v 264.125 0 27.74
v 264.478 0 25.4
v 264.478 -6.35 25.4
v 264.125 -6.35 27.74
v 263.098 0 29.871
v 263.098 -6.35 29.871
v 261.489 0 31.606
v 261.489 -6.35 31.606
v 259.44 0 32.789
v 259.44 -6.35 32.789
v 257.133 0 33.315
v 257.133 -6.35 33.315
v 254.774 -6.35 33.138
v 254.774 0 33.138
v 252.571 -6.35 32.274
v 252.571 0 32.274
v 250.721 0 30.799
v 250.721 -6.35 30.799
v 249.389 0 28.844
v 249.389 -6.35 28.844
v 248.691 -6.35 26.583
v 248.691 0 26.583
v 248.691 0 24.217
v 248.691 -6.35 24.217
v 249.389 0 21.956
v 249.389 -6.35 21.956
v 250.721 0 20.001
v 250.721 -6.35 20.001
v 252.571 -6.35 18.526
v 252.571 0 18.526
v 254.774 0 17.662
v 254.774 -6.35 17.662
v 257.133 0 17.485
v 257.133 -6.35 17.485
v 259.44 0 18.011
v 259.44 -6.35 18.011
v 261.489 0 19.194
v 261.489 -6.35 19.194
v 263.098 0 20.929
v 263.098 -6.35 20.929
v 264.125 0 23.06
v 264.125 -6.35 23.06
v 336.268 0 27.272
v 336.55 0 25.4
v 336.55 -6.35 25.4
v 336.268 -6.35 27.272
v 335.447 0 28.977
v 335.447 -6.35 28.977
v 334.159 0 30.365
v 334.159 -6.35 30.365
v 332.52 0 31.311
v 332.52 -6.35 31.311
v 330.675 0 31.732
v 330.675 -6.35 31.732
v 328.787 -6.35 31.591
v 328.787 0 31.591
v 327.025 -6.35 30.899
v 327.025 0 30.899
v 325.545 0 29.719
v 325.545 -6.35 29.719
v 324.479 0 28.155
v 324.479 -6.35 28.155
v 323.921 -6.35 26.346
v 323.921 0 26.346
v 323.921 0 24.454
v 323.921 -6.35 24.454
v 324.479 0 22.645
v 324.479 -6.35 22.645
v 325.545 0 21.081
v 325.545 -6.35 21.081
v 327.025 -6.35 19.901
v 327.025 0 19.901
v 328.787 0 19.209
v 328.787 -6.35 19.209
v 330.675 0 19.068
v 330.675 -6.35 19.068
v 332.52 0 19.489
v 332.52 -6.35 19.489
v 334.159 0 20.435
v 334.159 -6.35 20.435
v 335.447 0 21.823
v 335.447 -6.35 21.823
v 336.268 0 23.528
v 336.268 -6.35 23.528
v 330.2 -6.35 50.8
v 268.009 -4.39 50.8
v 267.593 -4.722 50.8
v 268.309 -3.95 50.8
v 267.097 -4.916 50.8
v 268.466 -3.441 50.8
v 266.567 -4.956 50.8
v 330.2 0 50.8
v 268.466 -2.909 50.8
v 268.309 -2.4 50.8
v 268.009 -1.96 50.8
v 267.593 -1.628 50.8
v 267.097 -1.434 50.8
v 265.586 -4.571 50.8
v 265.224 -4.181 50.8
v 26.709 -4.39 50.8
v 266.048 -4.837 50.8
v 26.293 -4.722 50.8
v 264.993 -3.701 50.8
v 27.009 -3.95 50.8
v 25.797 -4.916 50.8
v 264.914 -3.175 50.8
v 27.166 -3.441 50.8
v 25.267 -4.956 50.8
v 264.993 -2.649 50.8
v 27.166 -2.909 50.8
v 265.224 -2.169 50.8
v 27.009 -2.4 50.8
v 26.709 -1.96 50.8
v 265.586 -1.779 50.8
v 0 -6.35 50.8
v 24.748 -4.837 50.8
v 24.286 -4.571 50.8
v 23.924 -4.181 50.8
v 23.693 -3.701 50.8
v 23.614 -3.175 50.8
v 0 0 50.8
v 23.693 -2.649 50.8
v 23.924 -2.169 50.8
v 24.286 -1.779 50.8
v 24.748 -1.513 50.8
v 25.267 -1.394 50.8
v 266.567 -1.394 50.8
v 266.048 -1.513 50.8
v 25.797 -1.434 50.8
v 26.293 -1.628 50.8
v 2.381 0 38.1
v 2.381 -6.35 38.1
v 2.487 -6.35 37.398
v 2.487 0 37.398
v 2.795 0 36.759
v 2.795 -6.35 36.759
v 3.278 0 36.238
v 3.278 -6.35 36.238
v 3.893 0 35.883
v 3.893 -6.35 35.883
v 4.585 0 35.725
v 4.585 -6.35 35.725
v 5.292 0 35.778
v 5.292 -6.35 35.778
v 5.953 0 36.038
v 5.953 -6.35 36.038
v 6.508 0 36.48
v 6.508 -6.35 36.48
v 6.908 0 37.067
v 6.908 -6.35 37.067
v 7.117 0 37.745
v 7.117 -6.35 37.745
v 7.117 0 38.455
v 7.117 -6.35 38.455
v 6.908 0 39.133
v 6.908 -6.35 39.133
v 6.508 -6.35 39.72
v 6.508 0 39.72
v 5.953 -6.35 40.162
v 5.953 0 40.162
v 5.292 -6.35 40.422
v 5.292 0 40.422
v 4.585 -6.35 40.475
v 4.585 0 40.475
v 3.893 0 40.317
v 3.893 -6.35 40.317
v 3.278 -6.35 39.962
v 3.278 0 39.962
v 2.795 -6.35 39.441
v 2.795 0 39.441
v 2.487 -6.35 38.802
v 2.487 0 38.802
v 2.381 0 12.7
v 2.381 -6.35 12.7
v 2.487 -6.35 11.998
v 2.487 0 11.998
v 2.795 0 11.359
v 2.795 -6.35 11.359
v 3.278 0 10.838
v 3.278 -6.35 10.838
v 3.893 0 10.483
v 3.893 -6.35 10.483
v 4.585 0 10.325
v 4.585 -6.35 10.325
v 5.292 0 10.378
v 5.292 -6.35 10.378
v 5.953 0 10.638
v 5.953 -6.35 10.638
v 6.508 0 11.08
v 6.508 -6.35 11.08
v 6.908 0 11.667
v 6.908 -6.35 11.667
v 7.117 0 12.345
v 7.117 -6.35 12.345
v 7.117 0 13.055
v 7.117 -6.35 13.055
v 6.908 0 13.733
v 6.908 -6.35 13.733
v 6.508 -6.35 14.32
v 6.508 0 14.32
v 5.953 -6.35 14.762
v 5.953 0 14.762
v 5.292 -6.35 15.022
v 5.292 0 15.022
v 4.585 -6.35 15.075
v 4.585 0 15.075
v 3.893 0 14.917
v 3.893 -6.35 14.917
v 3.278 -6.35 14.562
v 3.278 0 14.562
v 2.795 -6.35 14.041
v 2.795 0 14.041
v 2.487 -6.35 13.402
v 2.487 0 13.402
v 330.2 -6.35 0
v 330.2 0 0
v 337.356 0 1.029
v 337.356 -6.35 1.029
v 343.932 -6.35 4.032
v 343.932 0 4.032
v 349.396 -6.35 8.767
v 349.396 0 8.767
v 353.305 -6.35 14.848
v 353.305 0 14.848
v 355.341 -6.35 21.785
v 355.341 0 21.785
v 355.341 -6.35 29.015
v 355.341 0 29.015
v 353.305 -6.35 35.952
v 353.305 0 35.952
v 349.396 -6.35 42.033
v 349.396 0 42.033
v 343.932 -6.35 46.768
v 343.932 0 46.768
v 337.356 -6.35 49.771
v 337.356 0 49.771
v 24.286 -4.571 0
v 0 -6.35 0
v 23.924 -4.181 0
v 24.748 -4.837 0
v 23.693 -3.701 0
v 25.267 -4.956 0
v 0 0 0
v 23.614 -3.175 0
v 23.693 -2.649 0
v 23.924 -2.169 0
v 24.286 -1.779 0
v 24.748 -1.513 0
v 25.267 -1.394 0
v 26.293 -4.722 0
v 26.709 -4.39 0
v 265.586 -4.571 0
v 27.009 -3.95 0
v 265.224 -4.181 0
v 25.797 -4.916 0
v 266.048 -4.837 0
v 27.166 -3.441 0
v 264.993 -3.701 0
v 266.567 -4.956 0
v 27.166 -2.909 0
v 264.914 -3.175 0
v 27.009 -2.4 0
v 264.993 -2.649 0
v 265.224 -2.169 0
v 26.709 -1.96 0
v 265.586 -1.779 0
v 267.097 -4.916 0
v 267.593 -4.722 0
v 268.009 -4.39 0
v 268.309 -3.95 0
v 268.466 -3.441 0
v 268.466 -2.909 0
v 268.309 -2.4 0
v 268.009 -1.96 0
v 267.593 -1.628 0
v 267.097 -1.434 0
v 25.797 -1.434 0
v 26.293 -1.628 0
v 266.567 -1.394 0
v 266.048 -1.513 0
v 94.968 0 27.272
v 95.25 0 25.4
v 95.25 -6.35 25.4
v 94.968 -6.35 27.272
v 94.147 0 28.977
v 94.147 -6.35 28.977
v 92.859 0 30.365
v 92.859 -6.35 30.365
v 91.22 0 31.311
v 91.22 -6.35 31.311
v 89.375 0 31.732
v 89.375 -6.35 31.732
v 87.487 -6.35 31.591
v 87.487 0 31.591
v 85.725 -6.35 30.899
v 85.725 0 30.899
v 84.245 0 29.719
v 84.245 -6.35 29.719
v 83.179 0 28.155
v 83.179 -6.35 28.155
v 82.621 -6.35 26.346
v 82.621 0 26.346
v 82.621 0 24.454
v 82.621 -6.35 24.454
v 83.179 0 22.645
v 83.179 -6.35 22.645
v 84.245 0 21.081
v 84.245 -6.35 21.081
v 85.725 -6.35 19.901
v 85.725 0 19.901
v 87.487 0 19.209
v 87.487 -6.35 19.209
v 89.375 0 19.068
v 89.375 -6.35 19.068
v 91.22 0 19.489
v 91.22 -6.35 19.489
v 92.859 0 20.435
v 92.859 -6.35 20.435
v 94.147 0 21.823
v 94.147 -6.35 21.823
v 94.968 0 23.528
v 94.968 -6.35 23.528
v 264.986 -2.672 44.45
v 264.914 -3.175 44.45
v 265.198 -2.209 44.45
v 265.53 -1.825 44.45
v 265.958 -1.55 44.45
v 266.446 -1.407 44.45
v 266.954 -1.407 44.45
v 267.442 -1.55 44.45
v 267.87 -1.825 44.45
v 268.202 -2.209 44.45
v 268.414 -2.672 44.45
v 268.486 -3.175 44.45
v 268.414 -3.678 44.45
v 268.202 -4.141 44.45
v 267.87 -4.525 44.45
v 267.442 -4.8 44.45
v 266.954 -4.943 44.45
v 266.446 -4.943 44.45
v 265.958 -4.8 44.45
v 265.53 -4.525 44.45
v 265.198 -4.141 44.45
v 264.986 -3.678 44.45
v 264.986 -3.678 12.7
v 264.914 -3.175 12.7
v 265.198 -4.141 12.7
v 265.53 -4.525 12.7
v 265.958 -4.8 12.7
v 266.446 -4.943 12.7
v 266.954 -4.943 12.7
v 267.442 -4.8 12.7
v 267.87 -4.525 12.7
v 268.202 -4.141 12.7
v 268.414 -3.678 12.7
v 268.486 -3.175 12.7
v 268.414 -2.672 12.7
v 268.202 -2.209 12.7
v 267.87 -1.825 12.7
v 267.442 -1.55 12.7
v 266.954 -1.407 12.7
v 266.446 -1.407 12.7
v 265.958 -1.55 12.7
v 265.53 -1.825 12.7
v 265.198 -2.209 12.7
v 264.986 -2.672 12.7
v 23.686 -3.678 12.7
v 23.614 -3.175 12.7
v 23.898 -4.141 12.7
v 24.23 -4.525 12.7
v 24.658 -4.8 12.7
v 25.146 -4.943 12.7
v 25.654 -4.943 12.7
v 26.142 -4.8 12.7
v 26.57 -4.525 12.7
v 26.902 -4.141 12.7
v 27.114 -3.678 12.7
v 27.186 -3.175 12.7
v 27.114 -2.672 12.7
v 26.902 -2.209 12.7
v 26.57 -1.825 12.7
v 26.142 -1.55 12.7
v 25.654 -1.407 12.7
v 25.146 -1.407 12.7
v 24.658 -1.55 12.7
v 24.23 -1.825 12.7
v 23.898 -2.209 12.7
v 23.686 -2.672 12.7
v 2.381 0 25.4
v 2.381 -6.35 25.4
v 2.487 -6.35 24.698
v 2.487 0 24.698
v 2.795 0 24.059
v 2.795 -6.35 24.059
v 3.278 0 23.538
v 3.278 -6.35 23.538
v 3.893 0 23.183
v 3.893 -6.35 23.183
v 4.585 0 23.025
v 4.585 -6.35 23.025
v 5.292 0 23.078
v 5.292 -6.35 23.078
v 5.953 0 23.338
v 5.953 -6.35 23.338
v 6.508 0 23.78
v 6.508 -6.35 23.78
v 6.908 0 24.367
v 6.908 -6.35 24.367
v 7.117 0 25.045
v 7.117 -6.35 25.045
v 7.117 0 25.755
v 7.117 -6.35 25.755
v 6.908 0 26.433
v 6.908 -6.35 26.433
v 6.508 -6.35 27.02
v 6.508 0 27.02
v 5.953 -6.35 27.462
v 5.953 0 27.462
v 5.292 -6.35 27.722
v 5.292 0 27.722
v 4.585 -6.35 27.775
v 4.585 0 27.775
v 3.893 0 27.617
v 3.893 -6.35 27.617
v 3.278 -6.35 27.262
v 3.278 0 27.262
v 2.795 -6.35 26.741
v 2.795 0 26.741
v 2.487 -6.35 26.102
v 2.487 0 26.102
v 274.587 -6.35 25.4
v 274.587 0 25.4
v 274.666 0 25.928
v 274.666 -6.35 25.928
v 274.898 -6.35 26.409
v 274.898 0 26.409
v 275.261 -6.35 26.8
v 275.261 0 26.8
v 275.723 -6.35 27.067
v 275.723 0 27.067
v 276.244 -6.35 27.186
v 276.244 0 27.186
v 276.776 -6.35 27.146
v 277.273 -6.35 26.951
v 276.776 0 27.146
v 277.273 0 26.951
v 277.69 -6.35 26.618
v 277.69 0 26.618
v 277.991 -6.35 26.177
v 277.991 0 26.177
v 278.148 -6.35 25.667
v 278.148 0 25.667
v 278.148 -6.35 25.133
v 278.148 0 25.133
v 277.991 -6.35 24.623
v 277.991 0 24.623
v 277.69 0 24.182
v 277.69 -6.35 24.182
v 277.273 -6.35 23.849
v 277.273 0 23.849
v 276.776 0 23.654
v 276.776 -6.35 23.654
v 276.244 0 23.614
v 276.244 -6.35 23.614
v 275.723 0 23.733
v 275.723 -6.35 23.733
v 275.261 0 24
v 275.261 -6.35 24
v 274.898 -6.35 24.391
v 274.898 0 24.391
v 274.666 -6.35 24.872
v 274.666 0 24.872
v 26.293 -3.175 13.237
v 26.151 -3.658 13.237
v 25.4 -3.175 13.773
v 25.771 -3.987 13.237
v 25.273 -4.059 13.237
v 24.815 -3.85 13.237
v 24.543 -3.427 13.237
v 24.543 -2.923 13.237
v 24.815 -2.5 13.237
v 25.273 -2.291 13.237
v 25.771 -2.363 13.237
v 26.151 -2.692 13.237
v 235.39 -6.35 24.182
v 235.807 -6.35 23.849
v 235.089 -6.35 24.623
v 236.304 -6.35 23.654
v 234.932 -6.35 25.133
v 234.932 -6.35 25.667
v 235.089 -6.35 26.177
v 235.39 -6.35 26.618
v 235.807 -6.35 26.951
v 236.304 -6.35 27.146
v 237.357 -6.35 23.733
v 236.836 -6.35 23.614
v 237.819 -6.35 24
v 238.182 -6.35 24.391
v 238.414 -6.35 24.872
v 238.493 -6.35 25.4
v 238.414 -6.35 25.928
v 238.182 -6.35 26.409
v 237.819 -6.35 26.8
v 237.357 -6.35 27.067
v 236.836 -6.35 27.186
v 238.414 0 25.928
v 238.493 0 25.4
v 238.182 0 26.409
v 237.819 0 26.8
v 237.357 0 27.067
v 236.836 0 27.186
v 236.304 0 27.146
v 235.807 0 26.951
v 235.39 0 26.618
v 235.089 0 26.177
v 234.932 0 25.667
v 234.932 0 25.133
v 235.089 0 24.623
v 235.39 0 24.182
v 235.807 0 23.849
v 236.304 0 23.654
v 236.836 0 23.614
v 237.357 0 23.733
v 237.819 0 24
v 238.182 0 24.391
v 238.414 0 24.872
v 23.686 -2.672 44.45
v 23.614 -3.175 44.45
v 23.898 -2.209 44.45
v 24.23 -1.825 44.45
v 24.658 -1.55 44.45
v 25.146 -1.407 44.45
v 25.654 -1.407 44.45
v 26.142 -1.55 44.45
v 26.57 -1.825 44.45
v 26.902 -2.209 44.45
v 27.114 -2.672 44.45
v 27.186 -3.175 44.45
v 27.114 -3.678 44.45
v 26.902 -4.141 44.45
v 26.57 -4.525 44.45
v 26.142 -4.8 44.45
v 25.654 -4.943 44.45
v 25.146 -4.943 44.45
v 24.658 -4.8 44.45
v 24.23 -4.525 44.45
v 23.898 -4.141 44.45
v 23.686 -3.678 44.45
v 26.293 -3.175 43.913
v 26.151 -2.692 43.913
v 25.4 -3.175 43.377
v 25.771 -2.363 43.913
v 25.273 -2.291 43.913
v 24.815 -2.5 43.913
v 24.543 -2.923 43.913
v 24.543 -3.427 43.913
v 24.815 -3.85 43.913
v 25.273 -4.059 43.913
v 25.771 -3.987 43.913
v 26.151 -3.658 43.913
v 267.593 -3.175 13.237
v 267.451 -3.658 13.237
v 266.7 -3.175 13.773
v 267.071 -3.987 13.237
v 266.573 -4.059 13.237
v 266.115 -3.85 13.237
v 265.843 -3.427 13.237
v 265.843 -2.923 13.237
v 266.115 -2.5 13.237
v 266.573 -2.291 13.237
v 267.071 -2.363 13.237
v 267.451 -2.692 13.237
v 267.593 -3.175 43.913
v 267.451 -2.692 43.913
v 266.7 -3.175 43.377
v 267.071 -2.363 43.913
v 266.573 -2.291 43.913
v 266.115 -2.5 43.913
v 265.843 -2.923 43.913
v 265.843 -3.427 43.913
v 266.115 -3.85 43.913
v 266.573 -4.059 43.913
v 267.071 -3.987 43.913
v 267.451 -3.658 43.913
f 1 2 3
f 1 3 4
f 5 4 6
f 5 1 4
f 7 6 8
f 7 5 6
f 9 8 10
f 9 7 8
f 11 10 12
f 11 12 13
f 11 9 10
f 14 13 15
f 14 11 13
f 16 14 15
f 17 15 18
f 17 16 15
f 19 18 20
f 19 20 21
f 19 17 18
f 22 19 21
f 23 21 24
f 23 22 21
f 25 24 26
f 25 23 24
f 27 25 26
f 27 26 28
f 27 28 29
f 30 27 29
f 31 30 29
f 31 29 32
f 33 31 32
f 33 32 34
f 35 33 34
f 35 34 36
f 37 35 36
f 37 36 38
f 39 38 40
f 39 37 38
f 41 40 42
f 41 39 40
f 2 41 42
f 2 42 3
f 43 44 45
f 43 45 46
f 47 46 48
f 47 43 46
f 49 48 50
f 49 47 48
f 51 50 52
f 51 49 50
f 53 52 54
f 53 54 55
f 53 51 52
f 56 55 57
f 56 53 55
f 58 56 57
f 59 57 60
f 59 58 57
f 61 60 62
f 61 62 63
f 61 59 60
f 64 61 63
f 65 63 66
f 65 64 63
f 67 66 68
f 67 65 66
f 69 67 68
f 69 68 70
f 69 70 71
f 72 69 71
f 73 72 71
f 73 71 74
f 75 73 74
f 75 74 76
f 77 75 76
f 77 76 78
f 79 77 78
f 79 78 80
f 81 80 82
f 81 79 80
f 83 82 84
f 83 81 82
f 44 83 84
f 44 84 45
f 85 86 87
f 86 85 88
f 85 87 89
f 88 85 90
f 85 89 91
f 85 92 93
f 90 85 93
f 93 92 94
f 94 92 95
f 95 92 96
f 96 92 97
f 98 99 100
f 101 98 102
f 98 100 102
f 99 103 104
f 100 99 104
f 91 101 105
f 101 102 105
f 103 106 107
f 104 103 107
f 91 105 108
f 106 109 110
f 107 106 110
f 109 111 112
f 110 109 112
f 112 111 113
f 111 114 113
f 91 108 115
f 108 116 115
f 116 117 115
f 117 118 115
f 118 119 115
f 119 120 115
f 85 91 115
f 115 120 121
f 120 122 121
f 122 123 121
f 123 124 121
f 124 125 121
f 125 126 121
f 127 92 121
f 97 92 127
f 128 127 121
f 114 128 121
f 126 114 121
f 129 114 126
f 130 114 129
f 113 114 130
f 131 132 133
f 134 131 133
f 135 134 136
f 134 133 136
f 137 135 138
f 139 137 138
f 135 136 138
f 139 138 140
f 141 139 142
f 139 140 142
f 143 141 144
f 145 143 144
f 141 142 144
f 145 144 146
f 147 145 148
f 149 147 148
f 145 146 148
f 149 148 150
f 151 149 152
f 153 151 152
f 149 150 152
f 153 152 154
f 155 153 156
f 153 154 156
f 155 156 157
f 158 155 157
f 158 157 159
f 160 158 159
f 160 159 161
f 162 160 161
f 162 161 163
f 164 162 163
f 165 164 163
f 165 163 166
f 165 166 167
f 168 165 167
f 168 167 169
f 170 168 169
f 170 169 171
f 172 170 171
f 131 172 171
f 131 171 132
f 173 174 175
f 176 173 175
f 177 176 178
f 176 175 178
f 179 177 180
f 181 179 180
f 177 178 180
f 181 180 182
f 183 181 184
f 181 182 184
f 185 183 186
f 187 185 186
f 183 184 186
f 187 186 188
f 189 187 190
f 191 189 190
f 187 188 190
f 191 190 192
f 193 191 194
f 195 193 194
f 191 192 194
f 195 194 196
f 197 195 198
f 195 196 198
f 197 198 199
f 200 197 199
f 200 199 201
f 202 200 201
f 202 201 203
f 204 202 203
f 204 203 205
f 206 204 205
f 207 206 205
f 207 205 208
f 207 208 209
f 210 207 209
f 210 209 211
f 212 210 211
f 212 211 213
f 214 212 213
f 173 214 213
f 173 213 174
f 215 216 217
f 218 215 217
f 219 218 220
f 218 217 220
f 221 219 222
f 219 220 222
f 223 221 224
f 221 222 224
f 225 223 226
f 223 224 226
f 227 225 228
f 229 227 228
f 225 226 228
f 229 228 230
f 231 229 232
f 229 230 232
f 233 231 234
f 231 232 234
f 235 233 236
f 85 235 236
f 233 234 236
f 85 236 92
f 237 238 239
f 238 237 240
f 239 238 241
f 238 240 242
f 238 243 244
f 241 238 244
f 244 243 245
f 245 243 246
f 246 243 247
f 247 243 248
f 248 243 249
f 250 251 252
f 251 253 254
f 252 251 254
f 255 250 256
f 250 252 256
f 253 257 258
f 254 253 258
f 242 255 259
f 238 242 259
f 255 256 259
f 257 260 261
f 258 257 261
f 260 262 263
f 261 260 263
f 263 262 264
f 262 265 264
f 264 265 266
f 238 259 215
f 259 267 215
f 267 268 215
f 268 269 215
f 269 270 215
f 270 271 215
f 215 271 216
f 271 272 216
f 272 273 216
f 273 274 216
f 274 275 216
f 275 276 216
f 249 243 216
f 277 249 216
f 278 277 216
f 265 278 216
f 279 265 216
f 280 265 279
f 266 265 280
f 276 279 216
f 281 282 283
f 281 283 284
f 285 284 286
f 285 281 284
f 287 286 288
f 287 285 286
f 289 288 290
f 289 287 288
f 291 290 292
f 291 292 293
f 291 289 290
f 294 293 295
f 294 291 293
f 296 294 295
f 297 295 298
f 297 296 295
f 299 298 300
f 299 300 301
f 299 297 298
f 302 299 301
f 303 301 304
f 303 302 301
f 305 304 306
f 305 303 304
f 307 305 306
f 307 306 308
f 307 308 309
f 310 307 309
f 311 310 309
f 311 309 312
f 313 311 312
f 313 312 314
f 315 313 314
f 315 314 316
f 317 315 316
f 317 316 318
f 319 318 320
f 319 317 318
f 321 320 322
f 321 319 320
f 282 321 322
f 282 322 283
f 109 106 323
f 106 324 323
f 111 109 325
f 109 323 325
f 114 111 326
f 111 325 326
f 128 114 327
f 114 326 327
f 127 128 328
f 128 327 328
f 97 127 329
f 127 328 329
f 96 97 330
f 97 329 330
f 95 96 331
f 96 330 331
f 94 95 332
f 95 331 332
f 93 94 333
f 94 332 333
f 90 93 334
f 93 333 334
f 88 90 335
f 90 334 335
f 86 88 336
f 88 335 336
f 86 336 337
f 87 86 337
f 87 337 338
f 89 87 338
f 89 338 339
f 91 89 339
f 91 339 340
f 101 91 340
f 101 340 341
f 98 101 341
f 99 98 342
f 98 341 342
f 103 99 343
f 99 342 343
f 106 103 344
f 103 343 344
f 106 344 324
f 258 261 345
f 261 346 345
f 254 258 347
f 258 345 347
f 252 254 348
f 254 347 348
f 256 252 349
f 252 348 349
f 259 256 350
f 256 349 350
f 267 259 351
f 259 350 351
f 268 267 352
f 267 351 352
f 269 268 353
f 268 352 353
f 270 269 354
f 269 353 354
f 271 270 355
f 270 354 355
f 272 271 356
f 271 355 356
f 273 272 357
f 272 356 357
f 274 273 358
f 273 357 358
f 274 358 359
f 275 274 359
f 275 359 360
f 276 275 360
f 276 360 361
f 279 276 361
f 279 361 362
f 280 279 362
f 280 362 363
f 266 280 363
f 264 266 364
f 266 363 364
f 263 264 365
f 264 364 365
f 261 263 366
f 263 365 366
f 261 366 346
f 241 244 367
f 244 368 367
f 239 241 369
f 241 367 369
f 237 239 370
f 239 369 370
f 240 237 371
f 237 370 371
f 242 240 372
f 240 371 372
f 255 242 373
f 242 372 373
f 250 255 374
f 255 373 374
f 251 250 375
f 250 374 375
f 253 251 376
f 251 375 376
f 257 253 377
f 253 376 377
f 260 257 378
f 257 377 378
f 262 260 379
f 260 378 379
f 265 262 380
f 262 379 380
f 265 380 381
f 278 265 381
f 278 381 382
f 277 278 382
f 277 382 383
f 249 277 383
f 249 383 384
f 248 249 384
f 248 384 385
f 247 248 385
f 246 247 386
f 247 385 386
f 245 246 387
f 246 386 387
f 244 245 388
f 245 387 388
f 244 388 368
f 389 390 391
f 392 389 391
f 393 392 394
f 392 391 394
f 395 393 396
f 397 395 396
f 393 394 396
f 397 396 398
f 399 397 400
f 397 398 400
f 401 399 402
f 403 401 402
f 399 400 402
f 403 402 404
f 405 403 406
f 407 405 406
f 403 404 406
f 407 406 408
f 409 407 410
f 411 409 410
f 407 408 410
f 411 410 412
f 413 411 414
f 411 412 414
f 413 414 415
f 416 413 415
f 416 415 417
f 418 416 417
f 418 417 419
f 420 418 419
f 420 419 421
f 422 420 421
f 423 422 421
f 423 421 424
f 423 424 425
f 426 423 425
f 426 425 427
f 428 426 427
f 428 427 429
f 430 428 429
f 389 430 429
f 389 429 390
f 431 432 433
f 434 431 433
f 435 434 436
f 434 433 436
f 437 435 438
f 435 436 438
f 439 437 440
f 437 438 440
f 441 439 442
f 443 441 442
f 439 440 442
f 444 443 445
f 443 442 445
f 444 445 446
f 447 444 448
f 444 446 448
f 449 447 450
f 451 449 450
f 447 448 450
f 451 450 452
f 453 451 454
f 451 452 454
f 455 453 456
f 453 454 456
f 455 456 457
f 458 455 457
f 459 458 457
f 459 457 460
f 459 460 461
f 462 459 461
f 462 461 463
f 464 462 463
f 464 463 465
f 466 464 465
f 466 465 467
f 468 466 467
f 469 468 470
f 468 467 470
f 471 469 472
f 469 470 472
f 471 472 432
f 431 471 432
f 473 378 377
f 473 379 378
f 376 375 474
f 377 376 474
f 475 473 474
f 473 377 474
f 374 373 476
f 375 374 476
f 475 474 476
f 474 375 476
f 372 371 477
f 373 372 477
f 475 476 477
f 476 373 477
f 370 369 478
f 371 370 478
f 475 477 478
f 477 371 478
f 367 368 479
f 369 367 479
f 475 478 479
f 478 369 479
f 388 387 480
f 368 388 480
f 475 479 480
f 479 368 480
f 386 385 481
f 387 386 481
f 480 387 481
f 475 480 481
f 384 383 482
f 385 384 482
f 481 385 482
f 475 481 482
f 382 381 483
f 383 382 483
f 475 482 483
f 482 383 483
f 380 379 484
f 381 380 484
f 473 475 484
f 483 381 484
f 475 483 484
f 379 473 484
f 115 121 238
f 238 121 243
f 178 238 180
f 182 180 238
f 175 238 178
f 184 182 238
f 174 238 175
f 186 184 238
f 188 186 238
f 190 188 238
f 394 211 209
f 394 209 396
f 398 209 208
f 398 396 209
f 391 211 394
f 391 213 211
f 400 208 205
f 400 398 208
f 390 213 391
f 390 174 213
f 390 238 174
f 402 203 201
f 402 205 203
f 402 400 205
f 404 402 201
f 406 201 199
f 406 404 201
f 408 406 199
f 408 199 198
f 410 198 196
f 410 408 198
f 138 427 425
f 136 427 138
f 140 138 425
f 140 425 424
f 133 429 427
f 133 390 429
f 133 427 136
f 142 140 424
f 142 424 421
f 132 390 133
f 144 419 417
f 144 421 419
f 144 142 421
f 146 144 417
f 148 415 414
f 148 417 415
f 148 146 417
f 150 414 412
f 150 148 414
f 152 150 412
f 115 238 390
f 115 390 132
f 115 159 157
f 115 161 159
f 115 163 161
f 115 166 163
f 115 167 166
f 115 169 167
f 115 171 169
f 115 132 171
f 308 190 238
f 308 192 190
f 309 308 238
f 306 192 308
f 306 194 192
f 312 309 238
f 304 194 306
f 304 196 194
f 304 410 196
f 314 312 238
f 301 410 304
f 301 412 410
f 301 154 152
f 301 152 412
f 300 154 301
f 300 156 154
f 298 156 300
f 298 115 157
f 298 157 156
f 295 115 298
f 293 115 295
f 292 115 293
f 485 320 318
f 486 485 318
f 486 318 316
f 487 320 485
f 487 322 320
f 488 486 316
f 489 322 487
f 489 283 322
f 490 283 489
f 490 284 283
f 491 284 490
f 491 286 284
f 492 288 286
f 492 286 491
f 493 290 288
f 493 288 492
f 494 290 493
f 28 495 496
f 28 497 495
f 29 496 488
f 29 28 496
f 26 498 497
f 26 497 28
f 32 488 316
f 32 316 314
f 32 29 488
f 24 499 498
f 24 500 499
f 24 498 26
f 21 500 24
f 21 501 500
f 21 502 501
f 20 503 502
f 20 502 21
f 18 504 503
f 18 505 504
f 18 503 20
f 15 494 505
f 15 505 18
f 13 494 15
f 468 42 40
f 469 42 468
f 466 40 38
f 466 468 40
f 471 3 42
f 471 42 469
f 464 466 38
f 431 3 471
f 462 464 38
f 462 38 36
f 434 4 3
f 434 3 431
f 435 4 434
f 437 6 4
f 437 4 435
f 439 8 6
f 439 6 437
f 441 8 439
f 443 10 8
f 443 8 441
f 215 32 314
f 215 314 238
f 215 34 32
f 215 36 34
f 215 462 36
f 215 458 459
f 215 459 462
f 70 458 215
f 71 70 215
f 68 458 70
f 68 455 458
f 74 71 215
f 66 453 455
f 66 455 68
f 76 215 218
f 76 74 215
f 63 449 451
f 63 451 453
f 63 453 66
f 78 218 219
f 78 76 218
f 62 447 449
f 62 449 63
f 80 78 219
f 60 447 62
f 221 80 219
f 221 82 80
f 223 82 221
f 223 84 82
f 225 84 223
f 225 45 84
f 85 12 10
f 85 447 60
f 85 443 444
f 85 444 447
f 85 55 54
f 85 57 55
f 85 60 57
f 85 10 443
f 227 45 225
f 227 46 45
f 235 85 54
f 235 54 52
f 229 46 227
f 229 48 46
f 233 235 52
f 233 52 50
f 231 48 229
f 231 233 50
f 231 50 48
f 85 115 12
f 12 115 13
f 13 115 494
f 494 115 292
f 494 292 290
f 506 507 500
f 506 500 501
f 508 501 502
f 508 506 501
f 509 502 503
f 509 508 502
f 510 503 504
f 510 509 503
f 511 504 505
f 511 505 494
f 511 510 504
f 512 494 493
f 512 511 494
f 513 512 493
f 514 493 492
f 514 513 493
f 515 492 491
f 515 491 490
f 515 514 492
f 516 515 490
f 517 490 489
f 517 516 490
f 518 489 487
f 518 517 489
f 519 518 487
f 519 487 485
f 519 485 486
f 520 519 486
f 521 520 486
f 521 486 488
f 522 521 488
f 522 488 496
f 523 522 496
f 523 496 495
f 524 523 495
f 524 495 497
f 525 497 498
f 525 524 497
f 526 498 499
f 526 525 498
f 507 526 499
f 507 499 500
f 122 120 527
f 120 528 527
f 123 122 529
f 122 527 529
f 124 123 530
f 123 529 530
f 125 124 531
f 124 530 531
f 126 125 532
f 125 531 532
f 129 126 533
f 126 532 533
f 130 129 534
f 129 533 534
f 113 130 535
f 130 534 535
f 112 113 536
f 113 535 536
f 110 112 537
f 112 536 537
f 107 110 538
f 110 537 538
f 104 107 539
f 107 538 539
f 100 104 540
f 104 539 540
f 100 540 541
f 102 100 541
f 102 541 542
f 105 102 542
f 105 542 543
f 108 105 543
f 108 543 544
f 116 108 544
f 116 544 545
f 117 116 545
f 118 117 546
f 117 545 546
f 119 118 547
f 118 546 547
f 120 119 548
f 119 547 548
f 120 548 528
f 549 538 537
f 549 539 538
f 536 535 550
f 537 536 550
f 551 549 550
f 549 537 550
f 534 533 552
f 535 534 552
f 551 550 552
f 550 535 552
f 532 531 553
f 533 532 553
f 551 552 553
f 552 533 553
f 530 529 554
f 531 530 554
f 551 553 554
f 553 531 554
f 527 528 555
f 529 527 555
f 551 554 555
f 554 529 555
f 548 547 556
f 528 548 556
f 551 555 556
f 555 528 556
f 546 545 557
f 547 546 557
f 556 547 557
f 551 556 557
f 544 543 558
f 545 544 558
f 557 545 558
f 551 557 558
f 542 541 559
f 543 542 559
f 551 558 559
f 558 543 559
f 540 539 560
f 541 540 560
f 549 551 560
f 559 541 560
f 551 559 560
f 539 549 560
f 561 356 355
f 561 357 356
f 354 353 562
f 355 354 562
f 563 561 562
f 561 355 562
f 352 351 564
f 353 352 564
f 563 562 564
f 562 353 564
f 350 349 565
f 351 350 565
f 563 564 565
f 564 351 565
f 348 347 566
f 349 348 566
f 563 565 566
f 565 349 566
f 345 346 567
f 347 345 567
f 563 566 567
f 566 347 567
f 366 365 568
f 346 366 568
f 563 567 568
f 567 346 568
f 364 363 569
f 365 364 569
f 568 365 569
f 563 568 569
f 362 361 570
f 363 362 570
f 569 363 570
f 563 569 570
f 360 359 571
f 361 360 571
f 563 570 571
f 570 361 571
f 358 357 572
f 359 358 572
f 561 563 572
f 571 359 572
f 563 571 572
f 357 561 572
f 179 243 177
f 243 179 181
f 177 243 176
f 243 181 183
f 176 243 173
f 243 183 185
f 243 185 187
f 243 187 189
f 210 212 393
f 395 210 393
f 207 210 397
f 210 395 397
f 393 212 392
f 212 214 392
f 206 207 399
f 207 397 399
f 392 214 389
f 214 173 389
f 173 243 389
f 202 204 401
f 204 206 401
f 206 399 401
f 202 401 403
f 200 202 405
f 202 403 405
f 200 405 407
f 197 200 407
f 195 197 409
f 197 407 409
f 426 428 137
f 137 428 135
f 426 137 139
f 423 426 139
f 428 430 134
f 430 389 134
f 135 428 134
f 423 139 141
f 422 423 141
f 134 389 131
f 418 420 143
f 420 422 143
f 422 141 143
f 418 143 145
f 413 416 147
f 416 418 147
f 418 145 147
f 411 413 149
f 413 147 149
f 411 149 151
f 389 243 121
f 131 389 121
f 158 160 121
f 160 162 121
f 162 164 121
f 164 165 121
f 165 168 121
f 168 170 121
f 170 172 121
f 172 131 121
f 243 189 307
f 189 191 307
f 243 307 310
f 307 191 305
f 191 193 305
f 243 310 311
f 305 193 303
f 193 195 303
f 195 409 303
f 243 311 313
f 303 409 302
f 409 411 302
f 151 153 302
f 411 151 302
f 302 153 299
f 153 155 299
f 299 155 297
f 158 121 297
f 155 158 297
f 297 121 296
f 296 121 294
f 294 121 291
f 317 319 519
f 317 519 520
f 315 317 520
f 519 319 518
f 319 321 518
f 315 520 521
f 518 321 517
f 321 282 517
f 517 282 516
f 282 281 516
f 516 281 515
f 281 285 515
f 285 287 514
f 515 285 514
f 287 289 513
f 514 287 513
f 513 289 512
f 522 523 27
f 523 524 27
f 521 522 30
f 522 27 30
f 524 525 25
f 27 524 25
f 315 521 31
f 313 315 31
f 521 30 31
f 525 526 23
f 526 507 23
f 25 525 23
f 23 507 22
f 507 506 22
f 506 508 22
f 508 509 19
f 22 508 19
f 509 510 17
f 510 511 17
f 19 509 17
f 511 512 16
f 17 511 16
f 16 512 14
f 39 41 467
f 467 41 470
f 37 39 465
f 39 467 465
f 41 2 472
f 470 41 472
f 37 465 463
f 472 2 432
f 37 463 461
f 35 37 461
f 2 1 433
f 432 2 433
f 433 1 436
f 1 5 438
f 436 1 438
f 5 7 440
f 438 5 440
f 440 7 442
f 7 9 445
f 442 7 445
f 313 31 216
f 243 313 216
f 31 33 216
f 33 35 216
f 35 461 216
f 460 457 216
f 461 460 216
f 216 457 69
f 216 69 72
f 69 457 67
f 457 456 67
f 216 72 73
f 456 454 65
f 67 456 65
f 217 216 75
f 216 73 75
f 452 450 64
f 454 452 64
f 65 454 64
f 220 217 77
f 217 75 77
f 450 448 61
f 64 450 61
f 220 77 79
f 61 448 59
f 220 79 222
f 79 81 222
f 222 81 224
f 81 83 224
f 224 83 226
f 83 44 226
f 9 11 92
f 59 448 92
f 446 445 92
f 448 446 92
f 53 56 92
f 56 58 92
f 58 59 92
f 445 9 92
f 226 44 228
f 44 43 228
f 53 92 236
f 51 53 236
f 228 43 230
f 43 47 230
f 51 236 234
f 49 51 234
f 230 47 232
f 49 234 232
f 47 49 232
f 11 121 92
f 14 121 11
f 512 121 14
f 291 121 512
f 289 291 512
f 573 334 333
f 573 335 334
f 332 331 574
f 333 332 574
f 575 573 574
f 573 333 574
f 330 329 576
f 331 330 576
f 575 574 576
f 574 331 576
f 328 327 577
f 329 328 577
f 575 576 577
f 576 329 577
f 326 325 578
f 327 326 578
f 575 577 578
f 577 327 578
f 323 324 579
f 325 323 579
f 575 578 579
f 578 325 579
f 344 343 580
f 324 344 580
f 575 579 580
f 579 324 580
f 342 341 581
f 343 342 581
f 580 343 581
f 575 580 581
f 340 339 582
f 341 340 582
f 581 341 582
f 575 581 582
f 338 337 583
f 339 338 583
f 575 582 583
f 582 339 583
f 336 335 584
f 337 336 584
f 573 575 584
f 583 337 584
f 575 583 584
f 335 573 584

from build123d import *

# Parameters (mm, degrees)
F0_R      = 6.35
F0_R_2    = 1.7907
F0_R_3    = 7.9375
F1_DEPTH  = 6.35
F2_D      = 4.7625
F2_DEPTH  = 12.7
F2_TIP    = 1.4307993491
F3_D      = 4.7625
F3_DEPTH  = 12.7
F3_TIP    = 1.4307993491
F4_D      = 4.7625
F4_DEPTH  = 12.7
F4_TIP    = 1.4307993491
F6_D      = 3.571875
F6_DEPTH  = 12.7
F6_TIP    = 1.0730995118
F7_D      = 3.571875
F7_DEPTH  = 12.7
F7_TIP    = 1.0730995118
F9_D      = 3.571875
F9_DEPTH  = 6.35
F9_TIP    = 1.0730995118
F10_D     = 3.571875
F10_DEPTH = 6.35
F10_TIP   = 1.0730995118


with BuildPart() as f1:
    # F0 (on Front) → F1 (new body)
    with BuildSketch(Plane.XZ):
        with BuildLine():
            Line((0, 50.8), (0, 0))
            Line((0, 0), (330.2, 0))
            ThreePointArc((330.2, 0), (355.6, 25.4), (330.2, 50.8))
            Line((330.2, 50.8), (0, 50.8))
        make_face()
        with Locations((88.9, 25.4)):
            Circle(F0_R, mode=Mode.SUBTRACT)
        with Locations((236.7026, 25.4)):
            Circle(F0_R_2, mode=Mode.SUBTRACT)
        with Locations((256.54, 25.4)):
            Circle(F0_R_3, mode=Mode.SUBTRACT)
        with BuildLine():
            ThreePointArc((278.1681, 25.4), (276.3774, 23.6093), (274.5867, 25.4))
            ThreePointArc((274.5867, 25.4), (276.3774, 27.1907), (278.1681, 25.4))
        make_face(mode=Mode.SUBTRACT)
        with Locations((330.2, 25.4)):
            Circle(F0_R, mode=Mode.SUBTRACT)
    extrude(amount=F1_DEPTH)

    # F2
    with Locations(Plane(origin=(0, 0, 0), x_dir=(1, 0, 0), z_dir=(0, 1, 0))):
        with Locations((4.7625, -25.4)):
            Hole(F2_D / 2, depth=F2_DEPTH)
            with Locations((0, 0, -(F2_DEPTH + F2_TIP / 2))):  # 118° drill point
                Cone(0, F2_D / 2, F2_TIP, mode=Mode.SUBTRACT)

    # F3
    with Locations(Plane(origin=(0, 0, 0), x_dir=(1, 0, 0), z_dir=(0, 1, 0))):
        with Locations((4.7625, -12.7)):
            Hole(F3_D / 2, depth=F3_DEPTH)
            with Locations((0, 0, -(F3_DEPTH + F3_TIP / 2))):  # 118° drill point
                Cone(0, F3_D / 2, F3_TIP, mode=Mode.SUBTRACT)

    # F4
    with Locations(Plane(origin=(0, 0, 0), x_dir=(1, 0, 0), z_dir=(0, 1, 0))):
        with Locations((4.7625, -38.1)):
            Hole(F4_D / 2, depth=F4_DEPTH)
            with Locations((0, 0, -(F4_DEPTH + F4_TIP / 2))):  # 118° drill point
                Cone(0, F4_D / 2, F4_TIP, mode=Mode.SUBTRACT)

    # F6
    with Locations(Plane(origin=(0, 0, 0), x_dir=(1, 0, 0), z_dir=(0, 0, -1))):
        with Locations((266.7, 3.175)):
            Hole(F6_D / 2, depth=F6_DEPTH)
            with Locations((0, 0, -(F6_DEPTH + F6_TIP / 2))):  # 118° drill point
                Cone(0, F6_D / 2, F6_TIP, mode=Mode.SUBTRACT)

    # F7
    with Locations(Plane(origin=(0, 0, 0), x_dir=(1, 0, 0), z_dir=(0, 0, -1))):
        with Locations((25.4, 3.175)):
            Hole(F7_D / 2, depth=F7_DEPTH)
            with Locations((0, 0, -(F7_DEPTH + F7_TIP / 2))):  # 118° drill point
                Cone(0, F7_D / 2, F7_TIP, mode=Mode.SUBTRACT)

    # F9
    with Locations(Plane.XY.offset(50.8)):
        with Locations((266.7, -3.175)):
            Hole(F9_D / 2, depth=F9_DEPTH)
            with Locations((0, 0, -(F9_DEPTH + F9_TIP / 2))):  # 118° drill point
                Cone(0, F9_D / 2, F9_TIP, mode=Mode.SUBTRACT)

    # F10
    with Locations(Plane.XY.offset(50.8)):
        with Locations((25.4, -3.175)):
            Hole(F10_D / 2, depth=F10_DEPTH)
            with Locations((0, 0, -(F10_DEPTH + F10_TIP / 2))):  # 118° drill point
                Cone(0, F10_D / 2, F10_TIP, mode=Mode.SUBTRACT)


solid = f1.part
